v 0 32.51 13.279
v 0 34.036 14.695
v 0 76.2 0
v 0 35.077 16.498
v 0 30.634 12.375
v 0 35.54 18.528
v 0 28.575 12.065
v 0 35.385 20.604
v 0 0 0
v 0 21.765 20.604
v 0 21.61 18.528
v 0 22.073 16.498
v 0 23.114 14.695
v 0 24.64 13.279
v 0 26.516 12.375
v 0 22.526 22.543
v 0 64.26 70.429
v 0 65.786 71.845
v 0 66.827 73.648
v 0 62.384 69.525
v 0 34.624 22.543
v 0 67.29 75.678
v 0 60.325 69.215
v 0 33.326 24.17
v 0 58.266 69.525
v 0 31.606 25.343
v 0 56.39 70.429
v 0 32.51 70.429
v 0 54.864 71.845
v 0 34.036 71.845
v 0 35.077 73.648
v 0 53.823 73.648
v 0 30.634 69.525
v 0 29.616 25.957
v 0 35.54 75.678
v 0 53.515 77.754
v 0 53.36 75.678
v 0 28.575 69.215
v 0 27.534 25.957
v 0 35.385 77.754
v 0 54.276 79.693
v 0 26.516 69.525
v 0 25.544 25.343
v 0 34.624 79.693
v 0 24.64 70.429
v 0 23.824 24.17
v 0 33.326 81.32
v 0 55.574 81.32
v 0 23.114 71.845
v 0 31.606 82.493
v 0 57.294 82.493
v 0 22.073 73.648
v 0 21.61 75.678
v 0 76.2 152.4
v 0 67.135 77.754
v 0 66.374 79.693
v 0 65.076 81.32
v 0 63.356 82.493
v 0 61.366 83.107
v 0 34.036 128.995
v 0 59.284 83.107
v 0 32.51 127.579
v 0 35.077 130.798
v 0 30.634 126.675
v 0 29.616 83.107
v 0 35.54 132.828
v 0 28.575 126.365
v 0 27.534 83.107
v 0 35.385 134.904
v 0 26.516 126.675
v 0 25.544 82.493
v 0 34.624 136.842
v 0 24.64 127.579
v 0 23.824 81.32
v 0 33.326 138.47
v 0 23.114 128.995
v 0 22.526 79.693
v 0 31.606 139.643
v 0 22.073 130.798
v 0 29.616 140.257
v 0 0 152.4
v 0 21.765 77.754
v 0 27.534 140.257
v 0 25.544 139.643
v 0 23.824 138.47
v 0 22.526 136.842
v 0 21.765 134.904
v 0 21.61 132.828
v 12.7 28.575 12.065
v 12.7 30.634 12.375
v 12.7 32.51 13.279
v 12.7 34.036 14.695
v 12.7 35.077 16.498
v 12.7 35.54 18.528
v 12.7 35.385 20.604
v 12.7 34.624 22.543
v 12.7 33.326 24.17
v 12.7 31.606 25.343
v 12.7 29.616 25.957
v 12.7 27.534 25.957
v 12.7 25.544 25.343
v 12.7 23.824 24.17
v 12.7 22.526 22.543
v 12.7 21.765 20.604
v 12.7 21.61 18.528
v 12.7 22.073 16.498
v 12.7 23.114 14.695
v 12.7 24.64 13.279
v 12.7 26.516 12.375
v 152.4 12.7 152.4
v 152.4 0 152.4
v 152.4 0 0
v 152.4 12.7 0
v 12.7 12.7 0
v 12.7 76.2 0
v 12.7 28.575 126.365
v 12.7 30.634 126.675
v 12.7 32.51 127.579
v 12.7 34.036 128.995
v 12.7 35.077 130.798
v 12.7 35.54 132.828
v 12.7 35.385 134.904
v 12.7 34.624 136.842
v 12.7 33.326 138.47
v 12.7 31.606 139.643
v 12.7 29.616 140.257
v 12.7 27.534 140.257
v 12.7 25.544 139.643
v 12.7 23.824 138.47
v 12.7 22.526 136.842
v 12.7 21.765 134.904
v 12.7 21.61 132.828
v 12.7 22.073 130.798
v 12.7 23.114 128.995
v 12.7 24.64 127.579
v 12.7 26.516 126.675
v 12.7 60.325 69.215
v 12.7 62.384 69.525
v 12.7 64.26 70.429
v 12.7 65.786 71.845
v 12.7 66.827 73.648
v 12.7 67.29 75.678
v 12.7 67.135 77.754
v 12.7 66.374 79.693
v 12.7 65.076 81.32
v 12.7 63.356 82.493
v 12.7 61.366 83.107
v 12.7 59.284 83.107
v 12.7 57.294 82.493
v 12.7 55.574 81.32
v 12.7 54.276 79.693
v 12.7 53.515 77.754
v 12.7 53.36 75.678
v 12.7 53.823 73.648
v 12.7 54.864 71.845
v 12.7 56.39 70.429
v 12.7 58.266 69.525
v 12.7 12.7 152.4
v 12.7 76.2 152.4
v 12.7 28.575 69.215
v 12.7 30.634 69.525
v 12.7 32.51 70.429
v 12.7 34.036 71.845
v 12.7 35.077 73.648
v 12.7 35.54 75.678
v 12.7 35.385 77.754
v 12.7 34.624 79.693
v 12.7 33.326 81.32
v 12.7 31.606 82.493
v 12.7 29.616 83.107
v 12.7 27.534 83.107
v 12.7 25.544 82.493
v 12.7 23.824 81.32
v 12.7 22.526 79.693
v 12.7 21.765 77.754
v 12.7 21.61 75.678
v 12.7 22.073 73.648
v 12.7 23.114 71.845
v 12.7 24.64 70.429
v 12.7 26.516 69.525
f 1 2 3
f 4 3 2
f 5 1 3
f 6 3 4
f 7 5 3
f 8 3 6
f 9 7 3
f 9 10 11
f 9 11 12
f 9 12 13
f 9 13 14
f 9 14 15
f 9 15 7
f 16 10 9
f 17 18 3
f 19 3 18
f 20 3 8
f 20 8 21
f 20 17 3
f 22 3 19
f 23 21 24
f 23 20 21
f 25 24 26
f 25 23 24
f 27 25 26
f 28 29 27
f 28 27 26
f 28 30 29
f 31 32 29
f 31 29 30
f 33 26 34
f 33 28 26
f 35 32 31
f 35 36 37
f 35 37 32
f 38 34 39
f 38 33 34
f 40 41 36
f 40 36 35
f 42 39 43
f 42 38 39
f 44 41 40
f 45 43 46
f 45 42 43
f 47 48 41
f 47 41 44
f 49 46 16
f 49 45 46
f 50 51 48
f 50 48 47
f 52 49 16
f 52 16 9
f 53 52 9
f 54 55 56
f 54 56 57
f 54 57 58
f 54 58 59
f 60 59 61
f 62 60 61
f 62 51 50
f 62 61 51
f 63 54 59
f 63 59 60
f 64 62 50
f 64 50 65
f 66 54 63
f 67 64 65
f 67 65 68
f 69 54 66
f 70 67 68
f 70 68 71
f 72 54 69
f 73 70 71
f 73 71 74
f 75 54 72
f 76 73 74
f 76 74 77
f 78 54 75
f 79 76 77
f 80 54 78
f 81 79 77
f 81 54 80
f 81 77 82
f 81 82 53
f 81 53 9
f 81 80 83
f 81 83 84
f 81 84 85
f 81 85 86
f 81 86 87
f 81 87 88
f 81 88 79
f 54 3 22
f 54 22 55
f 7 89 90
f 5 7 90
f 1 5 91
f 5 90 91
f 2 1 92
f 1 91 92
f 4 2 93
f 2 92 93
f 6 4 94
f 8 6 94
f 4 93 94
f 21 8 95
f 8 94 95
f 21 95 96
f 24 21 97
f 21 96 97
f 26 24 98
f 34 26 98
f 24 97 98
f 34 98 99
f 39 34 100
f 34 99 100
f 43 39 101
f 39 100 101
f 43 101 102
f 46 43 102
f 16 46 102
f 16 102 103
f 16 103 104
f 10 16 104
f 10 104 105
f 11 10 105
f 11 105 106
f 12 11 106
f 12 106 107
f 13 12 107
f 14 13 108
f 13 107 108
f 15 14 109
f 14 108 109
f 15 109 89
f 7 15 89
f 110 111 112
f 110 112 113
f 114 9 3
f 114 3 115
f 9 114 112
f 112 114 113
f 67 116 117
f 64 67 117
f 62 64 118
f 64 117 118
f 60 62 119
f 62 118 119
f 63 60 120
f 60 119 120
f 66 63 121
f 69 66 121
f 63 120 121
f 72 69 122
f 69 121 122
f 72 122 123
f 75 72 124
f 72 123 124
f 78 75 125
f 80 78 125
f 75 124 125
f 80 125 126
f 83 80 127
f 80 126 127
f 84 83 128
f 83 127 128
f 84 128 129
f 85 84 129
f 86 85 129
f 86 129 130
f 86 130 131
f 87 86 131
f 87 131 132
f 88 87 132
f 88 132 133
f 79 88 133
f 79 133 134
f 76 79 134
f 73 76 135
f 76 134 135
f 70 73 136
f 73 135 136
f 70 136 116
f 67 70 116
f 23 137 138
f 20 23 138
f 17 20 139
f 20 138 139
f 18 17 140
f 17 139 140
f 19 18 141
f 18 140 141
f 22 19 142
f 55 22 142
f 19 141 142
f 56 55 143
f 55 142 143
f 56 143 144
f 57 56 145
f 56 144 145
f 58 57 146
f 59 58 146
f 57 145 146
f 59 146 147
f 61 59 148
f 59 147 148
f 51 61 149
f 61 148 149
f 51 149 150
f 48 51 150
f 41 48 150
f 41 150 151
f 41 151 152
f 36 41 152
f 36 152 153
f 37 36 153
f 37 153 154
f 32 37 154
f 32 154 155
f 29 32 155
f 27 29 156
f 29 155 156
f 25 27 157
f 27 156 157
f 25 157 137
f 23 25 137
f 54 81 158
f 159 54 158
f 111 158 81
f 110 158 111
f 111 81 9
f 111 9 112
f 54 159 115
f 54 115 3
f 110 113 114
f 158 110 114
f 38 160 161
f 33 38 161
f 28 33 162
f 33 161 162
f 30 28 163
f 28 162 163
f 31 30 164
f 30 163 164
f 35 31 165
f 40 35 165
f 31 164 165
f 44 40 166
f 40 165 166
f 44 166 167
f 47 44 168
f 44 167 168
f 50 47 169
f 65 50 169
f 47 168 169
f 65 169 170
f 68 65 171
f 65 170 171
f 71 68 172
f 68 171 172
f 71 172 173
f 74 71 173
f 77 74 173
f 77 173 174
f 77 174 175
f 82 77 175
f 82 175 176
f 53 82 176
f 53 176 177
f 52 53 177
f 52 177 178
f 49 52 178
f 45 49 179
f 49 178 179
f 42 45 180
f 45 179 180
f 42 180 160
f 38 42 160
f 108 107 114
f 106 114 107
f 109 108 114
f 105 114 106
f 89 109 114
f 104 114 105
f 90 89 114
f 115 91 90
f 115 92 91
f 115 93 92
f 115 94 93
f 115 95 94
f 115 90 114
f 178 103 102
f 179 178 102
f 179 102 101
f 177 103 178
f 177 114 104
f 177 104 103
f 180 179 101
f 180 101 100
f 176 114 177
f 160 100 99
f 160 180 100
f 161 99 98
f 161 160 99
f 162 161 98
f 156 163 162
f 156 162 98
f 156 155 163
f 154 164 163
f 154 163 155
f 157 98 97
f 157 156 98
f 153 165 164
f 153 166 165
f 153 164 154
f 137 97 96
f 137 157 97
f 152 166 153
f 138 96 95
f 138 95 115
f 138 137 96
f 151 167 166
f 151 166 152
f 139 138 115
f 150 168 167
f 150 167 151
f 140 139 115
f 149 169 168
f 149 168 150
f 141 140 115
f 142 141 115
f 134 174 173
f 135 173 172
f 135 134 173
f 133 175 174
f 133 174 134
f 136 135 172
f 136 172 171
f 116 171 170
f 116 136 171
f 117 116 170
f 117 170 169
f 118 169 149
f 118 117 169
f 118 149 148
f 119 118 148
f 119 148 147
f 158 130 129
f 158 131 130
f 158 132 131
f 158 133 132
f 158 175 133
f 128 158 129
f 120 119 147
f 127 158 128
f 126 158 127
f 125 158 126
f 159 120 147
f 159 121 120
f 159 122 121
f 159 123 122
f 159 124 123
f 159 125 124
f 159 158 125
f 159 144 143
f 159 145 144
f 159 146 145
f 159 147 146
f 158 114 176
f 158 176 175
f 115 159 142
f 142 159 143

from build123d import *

# Parameters (mm, degrees)
SKETCH7_R          = 6.985
CUT_EXTRUDE4_DEPTH = 12.7


with BuildPart() as part:
    # Sweep1: sweep along a path in Sketch2
    with BuildLine(Plane(origin=(0, 0, 0), x_dir=(1, 0, 0), z_dir=(0, 1, 0))) as sweep1_path:
        Line((0, 0), (0, -152.4))
    # Sketch1 → Sweep1 (sweep)
    with BuildSketch(Plane.XY):
        Polygon((0, 0), (0, 76.2), (12.7, 76.2), (12.7, 12.7), (152.4, 12.7), (152.4, 0), align=None)
    sweep(path=sweep1_path.line)

    # Sketch7 → Cut-Extrude4 (cut)
    with BuildSketch(Plane(origin=(12.7, 0, 0), x_dir=(0, 0, -1), z_dir=(1, 0, 0))):
        with Locations((-133.35, 28.575)):
            Circle(SKETCH7_R)
        with Locations((-19.05, 28.575)):
            Circle(SKETCH7_R)
        with Locations((-76.2, 60.325)):
            Circle(SKETCH7_R)
        with Locations((-76.2, 28.575)):
            Circle(SKETCH7_R)
    extrude(amount=-CUT_EXTRUDE4_DEPTH, mode=Mode.SUBTRACT)


solid = part.part
